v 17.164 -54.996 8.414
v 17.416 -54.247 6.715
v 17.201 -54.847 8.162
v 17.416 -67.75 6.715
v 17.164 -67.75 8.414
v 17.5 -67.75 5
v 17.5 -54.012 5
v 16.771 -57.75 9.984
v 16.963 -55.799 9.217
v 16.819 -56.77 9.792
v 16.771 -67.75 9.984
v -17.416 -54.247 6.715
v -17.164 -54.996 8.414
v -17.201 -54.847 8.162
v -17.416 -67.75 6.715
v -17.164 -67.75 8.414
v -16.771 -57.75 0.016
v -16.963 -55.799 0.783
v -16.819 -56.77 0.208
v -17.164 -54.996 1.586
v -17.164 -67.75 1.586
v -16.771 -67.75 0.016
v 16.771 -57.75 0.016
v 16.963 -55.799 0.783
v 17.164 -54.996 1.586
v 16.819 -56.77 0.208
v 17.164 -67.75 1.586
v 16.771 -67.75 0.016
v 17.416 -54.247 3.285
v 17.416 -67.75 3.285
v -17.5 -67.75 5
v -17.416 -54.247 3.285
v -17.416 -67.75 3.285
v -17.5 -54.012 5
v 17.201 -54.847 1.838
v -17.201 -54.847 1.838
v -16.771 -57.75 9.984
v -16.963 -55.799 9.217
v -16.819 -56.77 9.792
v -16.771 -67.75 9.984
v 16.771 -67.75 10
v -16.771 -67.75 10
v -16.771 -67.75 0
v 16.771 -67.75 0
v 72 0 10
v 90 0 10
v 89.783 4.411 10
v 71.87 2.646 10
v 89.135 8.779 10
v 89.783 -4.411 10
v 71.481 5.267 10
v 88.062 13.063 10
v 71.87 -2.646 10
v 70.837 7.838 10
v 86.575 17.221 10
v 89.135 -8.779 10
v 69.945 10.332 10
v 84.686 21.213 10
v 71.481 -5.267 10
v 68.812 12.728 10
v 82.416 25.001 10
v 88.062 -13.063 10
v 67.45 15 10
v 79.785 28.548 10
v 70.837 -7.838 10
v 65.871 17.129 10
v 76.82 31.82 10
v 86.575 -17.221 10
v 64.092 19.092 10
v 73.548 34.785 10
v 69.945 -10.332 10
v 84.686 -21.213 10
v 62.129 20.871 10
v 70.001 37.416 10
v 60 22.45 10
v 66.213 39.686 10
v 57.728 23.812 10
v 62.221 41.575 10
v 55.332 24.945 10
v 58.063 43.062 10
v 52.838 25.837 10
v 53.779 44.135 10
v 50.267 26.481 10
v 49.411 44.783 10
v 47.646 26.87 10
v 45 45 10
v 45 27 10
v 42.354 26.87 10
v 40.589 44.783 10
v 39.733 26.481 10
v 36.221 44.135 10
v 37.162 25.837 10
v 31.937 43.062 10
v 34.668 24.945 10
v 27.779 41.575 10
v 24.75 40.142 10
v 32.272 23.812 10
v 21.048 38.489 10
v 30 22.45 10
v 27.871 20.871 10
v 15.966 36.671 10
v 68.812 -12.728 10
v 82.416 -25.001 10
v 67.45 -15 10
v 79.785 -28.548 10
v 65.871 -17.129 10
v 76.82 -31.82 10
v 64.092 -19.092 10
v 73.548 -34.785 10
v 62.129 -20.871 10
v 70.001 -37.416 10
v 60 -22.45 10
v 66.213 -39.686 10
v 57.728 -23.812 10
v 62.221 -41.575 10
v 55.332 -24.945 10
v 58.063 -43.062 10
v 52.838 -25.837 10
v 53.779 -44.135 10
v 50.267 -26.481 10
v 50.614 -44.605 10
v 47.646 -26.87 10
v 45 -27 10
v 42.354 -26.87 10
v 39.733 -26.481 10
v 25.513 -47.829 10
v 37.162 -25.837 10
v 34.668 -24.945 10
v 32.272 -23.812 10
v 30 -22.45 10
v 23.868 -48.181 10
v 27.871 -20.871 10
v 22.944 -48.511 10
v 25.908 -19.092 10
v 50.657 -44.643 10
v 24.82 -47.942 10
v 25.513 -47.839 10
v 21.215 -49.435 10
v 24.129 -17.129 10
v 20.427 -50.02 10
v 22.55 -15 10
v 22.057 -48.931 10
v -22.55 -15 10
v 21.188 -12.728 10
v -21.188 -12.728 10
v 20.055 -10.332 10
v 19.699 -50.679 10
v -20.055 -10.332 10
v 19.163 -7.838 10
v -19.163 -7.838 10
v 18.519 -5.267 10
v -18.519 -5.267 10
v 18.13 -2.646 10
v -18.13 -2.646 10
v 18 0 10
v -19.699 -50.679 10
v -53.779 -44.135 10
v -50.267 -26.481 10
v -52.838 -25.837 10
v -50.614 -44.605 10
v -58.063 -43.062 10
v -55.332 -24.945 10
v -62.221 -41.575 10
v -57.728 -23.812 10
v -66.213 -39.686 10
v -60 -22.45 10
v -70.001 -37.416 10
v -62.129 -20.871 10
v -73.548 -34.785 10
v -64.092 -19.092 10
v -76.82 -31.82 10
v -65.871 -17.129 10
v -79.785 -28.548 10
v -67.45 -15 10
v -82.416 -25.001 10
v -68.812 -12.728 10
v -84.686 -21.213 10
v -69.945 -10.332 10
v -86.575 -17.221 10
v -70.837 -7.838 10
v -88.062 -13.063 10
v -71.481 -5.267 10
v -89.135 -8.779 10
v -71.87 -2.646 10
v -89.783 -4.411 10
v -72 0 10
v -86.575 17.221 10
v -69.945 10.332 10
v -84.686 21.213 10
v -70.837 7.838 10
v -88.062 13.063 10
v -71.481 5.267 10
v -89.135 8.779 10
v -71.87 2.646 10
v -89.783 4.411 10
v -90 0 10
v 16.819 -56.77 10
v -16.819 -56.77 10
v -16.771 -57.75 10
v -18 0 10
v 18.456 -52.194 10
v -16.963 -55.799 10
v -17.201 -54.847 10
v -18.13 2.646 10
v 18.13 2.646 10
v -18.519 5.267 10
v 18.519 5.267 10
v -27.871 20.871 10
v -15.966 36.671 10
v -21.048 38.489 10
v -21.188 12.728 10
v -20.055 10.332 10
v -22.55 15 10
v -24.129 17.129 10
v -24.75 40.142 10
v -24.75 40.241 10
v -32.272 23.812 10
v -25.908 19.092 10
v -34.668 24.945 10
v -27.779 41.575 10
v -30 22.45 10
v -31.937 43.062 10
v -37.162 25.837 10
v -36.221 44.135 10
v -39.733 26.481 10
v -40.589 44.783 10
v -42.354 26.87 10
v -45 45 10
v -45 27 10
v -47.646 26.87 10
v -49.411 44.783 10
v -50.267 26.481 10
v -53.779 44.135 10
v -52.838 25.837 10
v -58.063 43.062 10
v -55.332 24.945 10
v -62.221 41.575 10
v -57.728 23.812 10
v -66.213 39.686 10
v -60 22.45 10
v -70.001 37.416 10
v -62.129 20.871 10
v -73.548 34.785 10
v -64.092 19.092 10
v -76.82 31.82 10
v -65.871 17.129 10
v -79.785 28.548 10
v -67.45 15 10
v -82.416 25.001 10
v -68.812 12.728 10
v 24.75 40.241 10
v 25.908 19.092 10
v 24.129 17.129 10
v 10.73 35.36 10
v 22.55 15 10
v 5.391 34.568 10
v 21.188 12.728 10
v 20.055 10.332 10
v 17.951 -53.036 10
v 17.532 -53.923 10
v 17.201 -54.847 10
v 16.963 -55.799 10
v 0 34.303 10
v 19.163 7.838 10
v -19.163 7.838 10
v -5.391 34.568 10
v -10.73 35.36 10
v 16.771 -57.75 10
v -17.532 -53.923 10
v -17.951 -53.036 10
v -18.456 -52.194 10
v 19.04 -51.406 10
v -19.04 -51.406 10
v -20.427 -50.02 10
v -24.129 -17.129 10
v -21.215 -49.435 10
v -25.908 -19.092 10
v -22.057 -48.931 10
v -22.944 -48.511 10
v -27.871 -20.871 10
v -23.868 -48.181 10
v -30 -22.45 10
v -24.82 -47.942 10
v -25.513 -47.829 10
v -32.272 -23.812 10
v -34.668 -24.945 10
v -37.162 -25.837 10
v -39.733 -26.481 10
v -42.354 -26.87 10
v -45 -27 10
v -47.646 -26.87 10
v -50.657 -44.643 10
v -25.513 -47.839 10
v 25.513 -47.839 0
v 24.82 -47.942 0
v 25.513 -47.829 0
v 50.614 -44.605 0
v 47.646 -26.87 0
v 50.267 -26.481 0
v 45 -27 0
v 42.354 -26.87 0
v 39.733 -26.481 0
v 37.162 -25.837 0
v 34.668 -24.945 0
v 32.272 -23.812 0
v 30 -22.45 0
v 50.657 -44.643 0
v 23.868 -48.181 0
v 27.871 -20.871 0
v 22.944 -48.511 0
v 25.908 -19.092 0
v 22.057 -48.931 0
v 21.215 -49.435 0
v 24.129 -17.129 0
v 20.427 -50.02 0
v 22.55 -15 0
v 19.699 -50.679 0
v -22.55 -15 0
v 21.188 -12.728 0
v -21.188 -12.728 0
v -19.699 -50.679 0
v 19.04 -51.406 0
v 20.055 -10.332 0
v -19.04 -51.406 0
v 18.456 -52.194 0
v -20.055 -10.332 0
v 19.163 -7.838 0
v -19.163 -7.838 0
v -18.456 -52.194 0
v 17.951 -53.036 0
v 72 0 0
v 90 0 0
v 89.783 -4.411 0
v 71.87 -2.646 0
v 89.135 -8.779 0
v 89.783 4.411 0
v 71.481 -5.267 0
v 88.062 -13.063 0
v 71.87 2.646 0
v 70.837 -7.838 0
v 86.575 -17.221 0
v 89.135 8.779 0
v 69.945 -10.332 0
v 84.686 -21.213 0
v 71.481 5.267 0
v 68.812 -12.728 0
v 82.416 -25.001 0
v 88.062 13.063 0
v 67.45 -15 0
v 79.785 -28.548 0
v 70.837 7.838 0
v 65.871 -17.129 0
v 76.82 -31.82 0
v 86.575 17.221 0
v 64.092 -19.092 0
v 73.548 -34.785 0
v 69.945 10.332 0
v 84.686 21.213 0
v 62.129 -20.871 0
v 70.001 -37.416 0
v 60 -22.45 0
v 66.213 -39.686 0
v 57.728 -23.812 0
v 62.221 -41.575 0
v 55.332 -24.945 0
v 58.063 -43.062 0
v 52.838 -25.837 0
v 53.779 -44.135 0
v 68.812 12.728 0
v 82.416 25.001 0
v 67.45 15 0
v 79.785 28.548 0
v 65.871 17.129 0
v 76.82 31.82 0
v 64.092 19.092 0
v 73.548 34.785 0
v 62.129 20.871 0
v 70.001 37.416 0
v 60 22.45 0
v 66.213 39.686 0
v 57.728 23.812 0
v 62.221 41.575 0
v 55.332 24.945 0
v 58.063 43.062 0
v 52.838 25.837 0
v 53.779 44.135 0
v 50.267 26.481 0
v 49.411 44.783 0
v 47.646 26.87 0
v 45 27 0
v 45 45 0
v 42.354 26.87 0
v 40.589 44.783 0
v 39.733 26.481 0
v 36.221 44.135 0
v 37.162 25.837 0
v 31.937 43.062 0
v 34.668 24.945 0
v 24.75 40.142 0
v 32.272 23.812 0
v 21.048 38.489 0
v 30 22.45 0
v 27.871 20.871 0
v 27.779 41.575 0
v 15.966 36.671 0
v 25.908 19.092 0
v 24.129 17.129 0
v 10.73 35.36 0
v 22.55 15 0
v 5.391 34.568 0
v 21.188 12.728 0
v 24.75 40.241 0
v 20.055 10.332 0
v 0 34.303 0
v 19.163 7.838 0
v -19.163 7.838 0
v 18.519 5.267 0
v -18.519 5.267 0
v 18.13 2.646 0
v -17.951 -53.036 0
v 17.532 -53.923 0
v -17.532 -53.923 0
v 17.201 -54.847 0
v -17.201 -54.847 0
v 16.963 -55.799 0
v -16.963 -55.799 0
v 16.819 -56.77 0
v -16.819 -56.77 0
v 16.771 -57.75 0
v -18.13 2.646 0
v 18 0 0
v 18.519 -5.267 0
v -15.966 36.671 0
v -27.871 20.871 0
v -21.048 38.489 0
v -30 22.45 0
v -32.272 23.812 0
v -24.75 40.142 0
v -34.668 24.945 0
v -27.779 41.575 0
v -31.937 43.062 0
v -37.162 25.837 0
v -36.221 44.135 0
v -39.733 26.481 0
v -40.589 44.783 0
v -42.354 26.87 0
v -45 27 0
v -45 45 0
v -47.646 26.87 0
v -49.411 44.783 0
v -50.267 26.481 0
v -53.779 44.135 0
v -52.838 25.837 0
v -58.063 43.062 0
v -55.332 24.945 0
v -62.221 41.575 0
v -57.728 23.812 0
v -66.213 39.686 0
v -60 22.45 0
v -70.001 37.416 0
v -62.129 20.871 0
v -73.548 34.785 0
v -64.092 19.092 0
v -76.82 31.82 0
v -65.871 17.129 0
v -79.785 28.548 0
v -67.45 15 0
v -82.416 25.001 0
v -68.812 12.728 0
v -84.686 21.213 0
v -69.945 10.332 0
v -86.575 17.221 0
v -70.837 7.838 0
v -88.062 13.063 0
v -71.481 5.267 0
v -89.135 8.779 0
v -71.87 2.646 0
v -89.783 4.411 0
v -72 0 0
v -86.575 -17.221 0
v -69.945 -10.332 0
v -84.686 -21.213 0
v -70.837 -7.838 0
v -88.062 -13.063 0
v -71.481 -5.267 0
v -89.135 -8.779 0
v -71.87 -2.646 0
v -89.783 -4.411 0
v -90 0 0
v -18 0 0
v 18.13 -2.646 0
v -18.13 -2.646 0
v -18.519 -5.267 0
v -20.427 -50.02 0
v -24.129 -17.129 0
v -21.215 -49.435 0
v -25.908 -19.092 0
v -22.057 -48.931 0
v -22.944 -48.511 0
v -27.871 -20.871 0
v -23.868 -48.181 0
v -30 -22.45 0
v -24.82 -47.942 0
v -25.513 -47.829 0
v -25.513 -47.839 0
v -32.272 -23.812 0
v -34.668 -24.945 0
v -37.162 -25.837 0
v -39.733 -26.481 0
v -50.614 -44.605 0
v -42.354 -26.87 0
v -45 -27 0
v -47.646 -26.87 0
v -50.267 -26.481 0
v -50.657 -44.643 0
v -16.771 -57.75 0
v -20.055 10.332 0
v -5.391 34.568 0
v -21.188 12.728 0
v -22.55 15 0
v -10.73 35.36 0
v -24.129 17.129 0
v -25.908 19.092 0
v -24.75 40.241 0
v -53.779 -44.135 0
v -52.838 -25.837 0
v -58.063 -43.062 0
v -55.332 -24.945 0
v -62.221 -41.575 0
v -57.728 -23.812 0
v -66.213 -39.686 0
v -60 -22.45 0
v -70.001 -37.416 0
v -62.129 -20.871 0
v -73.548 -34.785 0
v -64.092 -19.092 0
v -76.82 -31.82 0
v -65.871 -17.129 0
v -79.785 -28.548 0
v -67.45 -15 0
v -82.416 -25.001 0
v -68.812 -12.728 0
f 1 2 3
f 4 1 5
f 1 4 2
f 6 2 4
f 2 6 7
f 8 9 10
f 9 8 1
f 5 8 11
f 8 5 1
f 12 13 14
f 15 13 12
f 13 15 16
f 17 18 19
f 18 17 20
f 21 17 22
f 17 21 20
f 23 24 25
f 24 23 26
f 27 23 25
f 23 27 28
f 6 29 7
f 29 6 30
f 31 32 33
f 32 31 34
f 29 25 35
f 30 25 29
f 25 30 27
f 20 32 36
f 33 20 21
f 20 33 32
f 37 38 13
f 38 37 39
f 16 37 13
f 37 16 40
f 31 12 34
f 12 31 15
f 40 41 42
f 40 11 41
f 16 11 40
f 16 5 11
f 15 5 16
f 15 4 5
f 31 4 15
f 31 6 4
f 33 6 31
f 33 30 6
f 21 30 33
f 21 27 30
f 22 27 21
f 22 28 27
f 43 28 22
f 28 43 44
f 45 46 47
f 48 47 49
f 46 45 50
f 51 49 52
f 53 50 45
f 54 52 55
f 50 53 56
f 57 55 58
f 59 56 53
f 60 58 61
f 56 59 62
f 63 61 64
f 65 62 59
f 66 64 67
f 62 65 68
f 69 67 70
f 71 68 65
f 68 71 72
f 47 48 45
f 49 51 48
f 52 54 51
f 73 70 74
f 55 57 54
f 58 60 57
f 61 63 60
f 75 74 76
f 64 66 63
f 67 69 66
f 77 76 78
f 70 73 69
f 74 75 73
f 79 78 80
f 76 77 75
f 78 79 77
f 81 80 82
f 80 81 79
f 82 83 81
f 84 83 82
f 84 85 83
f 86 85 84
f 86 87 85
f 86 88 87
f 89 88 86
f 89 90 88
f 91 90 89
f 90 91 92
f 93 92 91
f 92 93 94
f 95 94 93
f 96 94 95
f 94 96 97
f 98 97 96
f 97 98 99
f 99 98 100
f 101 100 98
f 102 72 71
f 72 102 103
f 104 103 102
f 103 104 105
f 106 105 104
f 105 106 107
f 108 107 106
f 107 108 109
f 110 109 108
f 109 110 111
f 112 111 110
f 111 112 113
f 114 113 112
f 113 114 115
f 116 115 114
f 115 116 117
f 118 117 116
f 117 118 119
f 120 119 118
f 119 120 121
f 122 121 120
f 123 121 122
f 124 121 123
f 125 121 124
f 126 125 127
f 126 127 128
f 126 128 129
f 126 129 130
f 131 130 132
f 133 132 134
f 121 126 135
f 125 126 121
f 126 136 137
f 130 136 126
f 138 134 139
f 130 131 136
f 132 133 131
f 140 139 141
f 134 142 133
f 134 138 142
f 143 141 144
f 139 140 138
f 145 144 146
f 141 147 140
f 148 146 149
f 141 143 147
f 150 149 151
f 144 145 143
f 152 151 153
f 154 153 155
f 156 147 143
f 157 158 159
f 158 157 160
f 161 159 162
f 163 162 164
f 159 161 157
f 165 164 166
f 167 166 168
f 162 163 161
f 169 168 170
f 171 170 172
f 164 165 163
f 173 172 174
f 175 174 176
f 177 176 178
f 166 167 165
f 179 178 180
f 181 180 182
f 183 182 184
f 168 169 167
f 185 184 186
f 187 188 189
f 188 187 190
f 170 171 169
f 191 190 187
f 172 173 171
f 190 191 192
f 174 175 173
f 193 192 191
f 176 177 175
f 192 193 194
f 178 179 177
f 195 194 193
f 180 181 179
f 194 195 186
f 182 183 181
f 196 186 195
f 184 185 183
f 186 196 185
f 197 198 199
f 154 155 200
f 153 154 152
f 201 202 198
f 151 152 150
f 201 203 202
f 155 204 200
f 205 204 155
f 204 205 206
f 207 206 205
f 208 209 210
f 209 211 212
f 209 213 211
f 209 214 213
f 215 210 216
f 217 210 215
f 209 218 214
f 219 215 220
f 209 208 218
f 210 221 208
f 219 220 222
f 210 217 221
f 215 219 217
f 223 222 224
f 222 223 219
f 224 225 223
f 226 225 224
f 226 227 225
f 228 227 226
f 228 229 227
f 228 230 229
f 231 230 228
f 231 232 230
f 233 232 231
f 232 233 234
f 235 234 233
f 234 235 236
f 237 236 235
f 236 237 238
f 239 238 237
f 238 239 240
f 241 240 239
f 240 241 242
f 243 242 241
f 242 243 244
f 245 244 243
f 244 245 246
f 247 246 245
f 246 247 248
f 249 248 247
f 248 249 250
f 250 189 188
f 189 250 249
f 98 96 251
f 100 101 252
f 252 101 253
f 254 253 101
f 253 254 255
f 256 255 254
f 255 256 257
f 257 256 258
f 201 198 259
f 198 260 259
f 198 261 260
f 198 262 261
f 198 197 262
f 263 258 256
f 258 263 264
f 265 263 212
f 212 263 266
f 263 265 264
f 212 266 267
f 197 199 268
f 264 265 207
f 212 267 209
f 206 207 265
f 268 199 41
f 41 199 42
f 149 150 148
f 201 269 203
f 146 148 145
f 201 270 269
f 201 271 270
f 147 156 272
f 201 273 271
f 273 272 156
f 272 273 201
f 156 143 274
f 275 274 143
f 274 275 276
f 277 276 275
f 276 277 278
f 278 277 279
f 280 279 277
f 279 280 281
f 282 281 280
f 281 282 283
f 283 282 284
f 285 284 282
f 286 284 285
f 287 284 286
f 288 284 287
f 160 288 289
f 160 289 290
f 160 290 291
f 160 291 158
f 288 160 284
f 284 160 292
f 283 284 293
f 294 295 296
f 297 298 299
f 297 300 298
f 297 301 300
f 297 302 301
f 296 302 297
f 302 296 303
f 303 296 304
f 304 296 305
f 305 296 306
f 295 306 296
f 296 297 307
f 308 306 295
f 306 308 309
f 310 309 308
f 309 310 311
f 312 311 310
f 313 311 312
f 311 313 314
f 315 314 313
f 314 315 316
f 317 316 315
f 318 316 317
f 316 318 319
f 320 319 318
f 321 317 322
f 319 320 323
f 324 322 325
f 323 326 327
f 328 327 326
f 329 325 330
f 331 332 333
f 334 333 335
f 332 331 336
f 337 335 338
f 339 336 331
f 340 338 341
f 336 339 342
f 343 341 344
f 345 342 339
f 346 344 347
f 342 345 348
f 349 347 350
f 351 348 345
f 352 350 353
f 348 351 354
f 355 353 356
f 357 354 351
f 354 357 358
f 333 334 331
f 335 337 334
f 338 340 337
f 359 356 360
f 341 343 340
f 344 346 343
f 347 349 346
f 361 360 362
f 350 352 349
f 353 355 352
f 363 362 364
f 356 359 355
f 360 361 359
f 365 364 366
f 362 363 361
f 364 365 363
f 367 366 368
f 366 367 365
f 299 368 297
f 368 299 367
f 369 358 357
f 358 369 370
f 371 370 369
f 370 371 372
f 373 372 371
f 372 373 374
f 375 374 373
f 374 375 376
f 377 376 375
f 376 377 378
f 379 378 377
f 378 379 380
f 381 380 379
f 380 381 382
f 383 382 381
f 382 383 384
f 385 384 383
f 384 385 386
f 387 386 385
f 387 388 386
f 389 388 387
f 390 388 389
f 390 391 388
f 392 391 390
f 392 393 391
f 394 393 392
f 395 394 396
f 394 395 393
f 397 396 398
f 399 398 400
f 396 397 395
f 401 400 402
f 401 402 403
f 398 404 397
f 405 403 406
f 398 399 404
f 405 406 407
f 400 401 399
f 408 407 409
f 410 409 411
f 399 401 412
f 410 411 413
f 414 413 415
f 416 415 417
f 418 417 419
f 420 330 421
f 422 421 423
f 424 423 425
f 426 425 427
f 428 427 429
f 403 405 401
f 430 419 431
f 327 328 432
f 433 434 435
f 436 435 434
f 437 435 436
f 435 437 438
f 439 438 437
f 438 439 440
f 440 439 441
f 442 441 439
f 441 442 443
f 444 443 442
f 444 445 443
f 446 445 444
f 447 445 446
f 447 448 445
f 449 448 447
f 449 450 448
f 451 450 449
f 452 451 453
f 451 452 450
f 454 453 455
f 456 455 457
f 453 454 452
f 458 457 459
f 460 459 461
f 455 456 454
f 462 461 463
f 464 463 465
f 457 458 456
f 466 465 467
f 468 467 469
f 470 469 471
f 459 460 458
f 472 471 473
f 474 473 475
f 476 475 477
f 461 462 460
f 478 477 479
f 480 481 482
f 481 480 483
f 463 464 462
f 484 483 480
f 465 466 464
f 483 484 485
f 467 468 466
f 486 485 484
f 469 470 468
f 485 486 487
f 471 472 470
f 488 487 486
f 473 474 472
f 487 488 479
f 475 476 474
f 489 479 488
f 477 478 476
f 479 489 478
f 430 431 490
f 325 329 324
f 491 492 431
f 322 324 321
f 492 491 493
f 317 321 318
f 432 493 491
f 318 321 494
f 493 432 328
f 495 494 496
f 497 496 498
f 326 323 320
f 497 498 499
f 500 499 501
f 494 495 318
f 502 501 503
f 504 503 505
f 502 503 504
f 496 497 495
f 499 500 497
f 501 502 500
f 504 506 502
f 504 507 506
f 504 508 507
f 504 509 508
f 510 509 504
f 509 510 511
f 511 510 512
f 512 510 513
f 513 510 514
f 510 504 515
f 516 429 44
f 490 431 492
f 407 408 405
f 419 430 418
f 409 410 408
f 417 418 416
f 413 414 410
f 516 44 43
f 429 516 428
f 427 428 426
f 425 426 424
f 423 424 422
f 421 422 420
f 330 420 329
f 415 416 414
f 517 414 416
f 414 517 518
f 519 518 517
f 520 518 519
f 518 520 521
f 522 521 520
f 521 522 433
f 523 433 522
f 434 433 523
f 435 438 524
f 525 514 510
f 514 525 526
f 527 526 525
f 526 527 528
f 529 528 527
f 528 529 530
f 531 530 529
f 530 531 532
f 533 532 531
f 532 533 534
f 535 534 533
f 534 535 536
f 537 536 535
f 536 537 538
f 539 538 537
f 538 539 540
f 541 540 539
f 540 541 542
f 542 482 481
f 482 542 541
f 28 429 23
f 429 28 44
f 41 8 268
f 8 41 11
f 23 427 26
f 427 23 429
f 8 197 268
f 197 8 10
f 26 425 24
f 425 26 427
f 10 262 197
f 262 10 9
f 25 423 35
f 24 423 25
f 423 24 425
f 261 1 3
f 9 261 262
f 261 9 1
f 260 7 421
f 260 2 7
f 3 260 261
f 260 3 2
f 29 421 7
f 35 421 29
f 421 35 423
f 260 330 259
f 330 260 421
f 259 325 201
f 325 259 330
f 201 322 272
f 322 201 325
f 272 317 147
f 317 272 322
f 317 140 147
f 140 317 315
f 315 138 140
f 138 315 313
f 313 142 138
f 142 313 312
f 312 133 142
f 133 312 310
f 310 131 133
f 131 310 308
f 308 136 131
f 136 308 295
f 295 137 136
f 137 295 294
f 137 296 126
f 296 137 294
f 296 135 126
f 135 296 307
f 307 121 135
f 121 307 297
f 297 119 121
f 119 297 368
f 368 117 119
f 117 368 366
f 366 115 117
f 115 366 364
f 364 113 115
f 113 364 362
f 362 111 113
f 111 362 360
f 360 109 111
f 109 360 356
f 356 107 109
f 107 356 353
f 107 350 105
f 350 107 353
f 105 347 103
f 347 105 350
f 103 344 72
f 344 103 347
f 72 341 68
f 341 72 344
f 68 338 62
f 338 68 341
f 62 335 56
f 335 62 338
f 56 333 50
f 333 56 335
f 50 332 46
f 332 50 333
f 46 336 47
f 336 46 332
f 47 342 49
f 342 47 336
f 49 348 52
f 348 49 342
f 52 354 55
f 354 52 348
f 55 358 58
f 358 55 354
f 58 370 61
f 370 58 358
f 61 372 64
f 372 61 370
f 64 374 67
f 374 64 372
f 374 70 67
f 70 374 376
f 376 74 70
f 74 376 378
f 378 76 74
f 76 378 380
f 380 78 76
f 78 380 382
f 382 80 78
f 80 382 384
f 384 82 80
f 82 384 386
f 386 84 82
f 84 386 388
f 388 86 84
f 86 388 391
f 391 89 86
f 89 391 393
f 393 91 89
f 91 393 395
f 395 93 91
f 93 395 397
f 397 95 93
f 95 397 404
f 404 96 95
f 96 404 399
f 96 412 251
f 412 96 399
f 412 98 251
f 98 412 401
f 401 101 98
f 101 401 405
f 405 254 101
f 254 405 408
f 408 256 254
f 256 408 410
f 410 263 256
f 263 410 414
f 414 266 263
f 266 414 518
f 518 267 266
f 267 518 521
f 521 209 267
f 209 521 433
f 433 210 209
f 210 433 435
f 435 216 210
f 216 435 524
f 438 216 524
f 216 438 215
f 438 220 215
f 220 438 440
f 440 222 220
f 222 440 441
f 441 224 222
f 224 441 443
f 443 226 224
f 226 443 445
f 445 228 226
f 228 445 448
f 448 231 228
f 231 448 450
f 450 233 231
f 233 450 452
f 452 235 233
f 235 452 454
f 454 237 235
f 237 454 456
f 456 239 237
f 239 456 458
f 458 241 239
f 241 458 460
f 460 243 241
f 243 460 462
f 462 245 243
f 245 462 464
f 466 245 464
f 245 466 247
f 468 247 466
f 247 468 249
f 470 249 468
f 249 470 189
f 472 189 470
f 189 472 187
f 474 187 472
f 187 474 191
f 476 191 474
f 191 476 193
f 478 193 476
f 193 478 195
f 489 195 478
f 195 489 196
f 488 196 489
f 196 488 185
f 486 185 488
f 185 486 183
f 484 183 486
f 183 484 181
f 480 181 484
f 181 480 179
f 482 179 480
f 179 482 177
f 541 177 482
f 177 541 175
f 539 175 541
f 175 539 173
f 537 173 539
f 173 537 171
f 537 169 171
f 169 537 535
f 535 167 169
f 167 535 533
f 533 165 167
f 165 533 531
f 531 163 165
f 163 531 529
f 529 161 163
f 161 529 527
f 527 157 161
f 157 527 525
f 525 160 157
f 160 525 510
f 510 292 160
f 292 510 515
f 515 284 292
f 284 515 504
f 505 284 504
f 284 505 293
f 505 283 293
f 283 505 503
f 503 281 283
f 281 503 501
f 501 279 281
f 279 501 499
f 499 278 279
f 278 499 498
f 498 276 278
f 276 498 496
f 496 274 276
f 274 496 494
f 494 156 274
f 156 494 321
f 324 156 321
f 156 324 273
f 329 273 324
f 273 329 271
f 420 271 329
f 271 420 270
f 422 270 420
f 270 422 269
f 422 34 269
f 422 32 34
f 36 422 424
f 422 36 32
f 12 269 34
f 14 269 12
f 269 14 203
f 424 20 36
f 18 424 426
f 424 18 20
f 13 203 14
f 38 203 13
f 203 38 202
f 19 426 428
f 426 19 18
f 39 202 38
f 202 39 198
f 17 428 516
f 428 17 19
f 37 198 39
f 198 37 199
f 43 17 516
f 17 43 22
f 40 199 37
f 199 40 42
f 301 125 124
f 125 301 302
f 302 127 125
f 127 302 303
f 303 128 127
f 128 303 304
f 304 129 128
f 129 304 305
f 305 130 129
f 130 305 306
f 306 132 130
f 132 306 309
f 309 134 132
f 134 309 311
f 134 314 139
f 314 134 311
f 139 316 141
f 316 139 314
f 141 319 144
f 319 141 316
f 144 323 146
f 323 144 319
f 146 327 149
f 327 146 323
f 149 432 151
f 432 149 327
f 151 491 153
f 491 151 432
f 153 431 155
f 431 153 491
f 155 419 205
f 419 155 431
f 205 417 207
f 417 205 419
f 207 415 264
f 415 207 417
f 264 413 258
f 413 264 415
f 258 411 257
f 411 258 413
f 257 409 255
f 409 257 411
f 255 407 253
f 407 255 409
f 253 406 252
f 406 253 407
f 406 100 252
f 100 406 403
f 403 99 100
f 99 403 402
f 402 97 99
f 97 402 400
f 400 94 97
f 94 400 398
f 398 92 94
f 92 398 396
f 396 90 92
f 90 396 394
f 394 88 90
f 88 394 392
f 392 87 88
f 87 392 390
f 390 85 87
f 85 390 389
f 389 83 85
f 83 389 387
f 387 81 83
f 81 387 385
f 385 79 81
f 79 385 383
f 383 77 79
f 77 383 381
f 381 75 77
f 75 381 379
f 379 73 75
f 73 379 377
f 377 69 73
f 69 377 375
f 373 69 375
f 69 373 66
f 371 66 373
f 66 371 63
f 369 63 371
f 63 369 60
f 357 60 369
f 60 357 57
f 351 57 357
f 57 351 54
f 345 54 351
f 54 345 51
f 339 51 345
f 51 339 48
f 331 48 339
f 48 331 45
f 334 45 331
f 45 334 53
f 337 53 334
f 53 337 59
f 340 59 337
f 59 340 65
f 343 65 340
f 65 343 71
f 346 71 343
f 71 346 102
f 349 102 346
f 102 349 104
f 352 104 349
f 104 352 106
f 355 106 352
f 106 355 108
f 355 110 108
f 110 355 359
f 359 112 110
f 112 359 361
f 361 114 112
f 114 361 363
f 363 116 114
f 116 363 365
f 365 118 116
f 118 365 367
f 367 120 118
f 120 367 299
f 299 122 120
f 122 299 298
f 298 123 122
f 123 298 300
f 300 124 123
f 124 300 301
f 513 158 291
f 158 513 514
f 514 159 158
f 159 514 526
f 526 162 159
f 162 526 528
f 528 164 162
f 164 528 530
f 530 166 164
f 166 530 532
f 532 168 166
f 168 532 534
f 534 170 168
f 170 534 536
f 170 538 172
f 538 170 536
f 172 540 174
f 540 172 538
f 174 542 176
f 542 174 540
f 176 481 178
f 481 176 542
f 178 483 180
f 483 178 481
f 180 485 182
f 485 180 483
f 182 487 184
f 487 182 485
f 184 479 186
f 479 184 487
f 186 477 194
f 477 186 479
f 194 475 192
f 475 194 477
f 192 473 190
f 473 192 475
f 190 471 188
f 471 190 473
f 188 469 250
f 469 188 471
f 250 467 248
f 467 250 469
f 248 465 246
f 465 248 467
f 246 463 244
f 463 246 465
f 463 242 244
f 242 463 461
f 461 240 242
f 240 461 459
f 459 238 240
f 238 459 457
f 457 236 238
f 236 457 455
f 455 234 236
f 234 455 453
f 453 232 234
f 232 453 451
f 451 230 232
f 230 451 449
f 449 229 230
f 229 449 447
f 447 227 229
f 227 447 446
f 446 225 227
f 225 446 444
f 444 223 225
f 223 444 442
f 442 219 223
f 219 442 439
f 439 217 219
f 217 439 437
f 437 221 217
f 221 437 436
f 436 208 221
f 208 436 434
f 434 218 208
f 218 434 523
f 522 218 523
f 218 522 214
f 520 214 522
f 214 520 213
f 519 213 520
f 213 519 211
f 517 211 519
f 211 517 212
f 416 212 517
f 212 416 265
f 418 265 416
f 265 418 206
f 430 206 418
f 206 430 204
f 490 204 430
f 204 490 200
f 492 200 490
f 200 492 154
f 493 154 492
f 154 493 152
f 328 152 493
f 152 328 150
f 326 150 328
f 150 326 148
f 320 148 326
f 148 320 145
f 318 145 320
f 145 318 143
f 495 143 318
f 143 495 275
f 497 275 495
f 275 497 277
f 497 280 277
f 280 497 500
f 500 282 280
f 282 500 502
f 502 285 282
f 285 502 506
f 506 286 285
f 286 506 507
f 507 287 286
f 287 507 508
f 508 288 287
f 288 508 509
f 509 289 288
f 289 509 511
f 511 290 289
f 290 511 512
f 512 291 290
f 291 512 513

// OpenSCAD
// file: circle-tangents.scad
// Tangent points of two circles
// Sources
// http://www.ambrsoft.com/TrigoCalc/Circles2/Circles2Tangent_.htm
// http://mathworld.wolfram.com/Circle-CircleTangents.html

function sqr(x) = pow(x,2);
function sqrt(x) = pow(x, 1/2);

function getx(c, r, sc, s=1) =	let (cx=c[0], cy=c[1], px=sc[0], py=sc[1]) ((sqr(r)*(px-cx)+(s*r*(py-cy)*sqrt(sqr(px-cx)+sqr(py-cy)-sqr(r)))) /
			(sqr(px-cx)+sqr(py-cy)))
			+cx;

function gety(c, r, sc, s=1) =	let (cx=c[0], cy=c[1], px=sc[0], py=sc[1]) ((sqr(r)*(py-cy)+(s*r*(px-cx)*sqrt(sqr(px-cx)+sqr(py-cy)-sqr(r)))) /
			(sqr(px-cx)+sqr(py-cy)))
			+cy;
			
// Get center of similitude, either internal or external		
// s=-1 for external and 1 for internal
function GetSimCentre (c0, r0, c1, r1, s=-1) = let (a=c0[0], b=c0[1], c=c1[0], d=c1[1]) [(c*r0+s*a*r1)/(r0+s*r1), (d*r0+s*b*r1)/(r0+s*r1)];

// c=centre of circle, r=radius, sc=center of similitude
// s selects which tangent point on circle depending on whether 1 or -1
function GetTangent (c, r, sc, s=1) = [getx(c, r, sc, s), gety(c, r, sc, s=-s)];

// test
$fn = 64;

// Some test circles
c0 = [25, 6];
r0 = 10;
c1 = [5, 22];
r1 = 3;

// Show circles with both internal and etxernal points of similitude
for (whichsc = [-1, 1]) translate ([(r0+r1)*1*whichsc, 0, 0]) {
	// Get center of similitude, either internal or external		
	// s=-1 for external and 1 for internal
	sc = GetSimCentre(c0, r0, c1, r1, s=whichsc); 

	// Points on C0
	t0 = GetTangent(c0, r0, sc, s=1);
	t1 = GetTangent(c0, r0, sc, s=-1);

	// Points on C1
	t2 = GetTangent(c1, r1, sc, s=1);
	t3 = GetTangent(c1, r1, sc, s=-1);

	// Show circles
	linear_extrude (height=1) {
		translate (c0) circle (r=r0);
		translate (c1) circle (r=r1);
	}

	/*  Points just for debug
	translate (sc) color ("blue") circle (r=1);
	translate (t0) color ("blue") circle (r=1);
	translate (t1) color ("blue") circle (r=1);
	translate (t2) color ("blue") circle (r=1);
	translate (t3) color ("blue") circle (r=1);
	*/
	
	// Show "fillet" based on point of similitude
	translate ([0, 0, 0.01]) color("red") linear_extrude (height=0.98) polygon ([t0, t2, t3, t1]);
}
// main file
$fn=64;
use <circle-tangents.scad>



function sq(x) = pow(x,2);

r2 = 45;  // flaps radius
x2 = 45;  // flaps distance

r1 = 55;  // top dent
y1 = sqrt(sq(r1 + r2) - sq(x2));

q = r1 / (r1 + r2);

r3 = r2 * 0.6; // flaps hole

hd = 35;  // handle diameter
eh = 10;  // extrude height

hw = sqrt(sq(hd) - sq(eh));

r5 = 10;  // radius of the lower rounding
x5 = (hw / 2) + r5;
y5 = - (r2 + r5) * 1.05;  // begining handle

c0 = [-x2, 0];
c1 = [-x5, y5];
c2 = [x2, 0];
c3 = [x5, y5];

sc = GetSimCentre(c0, r2, c1, r5, s=1); 
t0 = GetTangent(c0, r2, sc, s=1);
t2 = GetTangent(c1, r5, sc, s=1);

d = -c1.x - r5;
echo("handle width", d * 2);
ph = 10; // handle rectangular protusion height

hh = t0.y - y5 + ph;
x = hd / 2 - eh /2;

linear_extrude(height=eh) {
    difference() {
        union() {
            difference() {
                union() {
                    translate([x2, 0]) circle(r2);
                    translate([-x2, 0]) circle(r2);
                    translate([-q * x2, 0]) square([q * x2 * 2, q * y1]);
                }
                translate([0, y1]) circle(r1);
                translate([x2, 0]) circle(r3);
                translate([-x2, 0]) circle(r3);
            }
            polygon ([[0, 0], t0, t2, [-t2.x, t2.y], [-t0.x, t0.y]]);
            translate([0, y5]) square([-t2.x, -y5 + t2.y]);
            translate([t2[0], y5]) square([-t2.y, -y5 + t2.y]);
        }
        translate(c3) circle(r5);
        translate(c1) circle(r5);
    }
    translate([-d, c1.y - r5]) square([d * 2, 10]);
}

echo(y5, hh, ph, eh, hd, d);


difference() {
    translate([0, y5 + (hh - ph), eh / 2]) color("red") rotate([90, 0, 0]) cylinder(hh, d=hd);
    translate([-hd / 2, y5 - ph, eh]) cube([hd, hh, x]);
    translate([-hd / 2, y5 - ph, -x]) cube([hd, hh, x]);
}

/*
translate([0, y5 - ph, eh/2]) rotate([0, 90, 90]) difference() {
    translate([0,0,0]) color("red") rotate([0, 0, 0]) cylinder(eh, d=hd);
    //translate([-hd / 2, y5 - ph, eh]) cube([hd, hh, x]);
    translate([0, hd/2, 0]) rotate([90, 0, 0]) linear_extrude(height=hd) polygon([[hd/2, 0], [hd/2, ph], [eh/2, ph]]);
    translate([0, hd/2, 0]) rotate([90, 0, 0]) linear_extrude(height=hd) polygon([[-hd/2, 0], [-hd/2, ph], [-eh/2, ph]]);
}
*/
//translate([0, y5 + (hh - ph), eh / 2]) color("red") rotate([90, 0, 0]) cylinder(hh, d=hd);
